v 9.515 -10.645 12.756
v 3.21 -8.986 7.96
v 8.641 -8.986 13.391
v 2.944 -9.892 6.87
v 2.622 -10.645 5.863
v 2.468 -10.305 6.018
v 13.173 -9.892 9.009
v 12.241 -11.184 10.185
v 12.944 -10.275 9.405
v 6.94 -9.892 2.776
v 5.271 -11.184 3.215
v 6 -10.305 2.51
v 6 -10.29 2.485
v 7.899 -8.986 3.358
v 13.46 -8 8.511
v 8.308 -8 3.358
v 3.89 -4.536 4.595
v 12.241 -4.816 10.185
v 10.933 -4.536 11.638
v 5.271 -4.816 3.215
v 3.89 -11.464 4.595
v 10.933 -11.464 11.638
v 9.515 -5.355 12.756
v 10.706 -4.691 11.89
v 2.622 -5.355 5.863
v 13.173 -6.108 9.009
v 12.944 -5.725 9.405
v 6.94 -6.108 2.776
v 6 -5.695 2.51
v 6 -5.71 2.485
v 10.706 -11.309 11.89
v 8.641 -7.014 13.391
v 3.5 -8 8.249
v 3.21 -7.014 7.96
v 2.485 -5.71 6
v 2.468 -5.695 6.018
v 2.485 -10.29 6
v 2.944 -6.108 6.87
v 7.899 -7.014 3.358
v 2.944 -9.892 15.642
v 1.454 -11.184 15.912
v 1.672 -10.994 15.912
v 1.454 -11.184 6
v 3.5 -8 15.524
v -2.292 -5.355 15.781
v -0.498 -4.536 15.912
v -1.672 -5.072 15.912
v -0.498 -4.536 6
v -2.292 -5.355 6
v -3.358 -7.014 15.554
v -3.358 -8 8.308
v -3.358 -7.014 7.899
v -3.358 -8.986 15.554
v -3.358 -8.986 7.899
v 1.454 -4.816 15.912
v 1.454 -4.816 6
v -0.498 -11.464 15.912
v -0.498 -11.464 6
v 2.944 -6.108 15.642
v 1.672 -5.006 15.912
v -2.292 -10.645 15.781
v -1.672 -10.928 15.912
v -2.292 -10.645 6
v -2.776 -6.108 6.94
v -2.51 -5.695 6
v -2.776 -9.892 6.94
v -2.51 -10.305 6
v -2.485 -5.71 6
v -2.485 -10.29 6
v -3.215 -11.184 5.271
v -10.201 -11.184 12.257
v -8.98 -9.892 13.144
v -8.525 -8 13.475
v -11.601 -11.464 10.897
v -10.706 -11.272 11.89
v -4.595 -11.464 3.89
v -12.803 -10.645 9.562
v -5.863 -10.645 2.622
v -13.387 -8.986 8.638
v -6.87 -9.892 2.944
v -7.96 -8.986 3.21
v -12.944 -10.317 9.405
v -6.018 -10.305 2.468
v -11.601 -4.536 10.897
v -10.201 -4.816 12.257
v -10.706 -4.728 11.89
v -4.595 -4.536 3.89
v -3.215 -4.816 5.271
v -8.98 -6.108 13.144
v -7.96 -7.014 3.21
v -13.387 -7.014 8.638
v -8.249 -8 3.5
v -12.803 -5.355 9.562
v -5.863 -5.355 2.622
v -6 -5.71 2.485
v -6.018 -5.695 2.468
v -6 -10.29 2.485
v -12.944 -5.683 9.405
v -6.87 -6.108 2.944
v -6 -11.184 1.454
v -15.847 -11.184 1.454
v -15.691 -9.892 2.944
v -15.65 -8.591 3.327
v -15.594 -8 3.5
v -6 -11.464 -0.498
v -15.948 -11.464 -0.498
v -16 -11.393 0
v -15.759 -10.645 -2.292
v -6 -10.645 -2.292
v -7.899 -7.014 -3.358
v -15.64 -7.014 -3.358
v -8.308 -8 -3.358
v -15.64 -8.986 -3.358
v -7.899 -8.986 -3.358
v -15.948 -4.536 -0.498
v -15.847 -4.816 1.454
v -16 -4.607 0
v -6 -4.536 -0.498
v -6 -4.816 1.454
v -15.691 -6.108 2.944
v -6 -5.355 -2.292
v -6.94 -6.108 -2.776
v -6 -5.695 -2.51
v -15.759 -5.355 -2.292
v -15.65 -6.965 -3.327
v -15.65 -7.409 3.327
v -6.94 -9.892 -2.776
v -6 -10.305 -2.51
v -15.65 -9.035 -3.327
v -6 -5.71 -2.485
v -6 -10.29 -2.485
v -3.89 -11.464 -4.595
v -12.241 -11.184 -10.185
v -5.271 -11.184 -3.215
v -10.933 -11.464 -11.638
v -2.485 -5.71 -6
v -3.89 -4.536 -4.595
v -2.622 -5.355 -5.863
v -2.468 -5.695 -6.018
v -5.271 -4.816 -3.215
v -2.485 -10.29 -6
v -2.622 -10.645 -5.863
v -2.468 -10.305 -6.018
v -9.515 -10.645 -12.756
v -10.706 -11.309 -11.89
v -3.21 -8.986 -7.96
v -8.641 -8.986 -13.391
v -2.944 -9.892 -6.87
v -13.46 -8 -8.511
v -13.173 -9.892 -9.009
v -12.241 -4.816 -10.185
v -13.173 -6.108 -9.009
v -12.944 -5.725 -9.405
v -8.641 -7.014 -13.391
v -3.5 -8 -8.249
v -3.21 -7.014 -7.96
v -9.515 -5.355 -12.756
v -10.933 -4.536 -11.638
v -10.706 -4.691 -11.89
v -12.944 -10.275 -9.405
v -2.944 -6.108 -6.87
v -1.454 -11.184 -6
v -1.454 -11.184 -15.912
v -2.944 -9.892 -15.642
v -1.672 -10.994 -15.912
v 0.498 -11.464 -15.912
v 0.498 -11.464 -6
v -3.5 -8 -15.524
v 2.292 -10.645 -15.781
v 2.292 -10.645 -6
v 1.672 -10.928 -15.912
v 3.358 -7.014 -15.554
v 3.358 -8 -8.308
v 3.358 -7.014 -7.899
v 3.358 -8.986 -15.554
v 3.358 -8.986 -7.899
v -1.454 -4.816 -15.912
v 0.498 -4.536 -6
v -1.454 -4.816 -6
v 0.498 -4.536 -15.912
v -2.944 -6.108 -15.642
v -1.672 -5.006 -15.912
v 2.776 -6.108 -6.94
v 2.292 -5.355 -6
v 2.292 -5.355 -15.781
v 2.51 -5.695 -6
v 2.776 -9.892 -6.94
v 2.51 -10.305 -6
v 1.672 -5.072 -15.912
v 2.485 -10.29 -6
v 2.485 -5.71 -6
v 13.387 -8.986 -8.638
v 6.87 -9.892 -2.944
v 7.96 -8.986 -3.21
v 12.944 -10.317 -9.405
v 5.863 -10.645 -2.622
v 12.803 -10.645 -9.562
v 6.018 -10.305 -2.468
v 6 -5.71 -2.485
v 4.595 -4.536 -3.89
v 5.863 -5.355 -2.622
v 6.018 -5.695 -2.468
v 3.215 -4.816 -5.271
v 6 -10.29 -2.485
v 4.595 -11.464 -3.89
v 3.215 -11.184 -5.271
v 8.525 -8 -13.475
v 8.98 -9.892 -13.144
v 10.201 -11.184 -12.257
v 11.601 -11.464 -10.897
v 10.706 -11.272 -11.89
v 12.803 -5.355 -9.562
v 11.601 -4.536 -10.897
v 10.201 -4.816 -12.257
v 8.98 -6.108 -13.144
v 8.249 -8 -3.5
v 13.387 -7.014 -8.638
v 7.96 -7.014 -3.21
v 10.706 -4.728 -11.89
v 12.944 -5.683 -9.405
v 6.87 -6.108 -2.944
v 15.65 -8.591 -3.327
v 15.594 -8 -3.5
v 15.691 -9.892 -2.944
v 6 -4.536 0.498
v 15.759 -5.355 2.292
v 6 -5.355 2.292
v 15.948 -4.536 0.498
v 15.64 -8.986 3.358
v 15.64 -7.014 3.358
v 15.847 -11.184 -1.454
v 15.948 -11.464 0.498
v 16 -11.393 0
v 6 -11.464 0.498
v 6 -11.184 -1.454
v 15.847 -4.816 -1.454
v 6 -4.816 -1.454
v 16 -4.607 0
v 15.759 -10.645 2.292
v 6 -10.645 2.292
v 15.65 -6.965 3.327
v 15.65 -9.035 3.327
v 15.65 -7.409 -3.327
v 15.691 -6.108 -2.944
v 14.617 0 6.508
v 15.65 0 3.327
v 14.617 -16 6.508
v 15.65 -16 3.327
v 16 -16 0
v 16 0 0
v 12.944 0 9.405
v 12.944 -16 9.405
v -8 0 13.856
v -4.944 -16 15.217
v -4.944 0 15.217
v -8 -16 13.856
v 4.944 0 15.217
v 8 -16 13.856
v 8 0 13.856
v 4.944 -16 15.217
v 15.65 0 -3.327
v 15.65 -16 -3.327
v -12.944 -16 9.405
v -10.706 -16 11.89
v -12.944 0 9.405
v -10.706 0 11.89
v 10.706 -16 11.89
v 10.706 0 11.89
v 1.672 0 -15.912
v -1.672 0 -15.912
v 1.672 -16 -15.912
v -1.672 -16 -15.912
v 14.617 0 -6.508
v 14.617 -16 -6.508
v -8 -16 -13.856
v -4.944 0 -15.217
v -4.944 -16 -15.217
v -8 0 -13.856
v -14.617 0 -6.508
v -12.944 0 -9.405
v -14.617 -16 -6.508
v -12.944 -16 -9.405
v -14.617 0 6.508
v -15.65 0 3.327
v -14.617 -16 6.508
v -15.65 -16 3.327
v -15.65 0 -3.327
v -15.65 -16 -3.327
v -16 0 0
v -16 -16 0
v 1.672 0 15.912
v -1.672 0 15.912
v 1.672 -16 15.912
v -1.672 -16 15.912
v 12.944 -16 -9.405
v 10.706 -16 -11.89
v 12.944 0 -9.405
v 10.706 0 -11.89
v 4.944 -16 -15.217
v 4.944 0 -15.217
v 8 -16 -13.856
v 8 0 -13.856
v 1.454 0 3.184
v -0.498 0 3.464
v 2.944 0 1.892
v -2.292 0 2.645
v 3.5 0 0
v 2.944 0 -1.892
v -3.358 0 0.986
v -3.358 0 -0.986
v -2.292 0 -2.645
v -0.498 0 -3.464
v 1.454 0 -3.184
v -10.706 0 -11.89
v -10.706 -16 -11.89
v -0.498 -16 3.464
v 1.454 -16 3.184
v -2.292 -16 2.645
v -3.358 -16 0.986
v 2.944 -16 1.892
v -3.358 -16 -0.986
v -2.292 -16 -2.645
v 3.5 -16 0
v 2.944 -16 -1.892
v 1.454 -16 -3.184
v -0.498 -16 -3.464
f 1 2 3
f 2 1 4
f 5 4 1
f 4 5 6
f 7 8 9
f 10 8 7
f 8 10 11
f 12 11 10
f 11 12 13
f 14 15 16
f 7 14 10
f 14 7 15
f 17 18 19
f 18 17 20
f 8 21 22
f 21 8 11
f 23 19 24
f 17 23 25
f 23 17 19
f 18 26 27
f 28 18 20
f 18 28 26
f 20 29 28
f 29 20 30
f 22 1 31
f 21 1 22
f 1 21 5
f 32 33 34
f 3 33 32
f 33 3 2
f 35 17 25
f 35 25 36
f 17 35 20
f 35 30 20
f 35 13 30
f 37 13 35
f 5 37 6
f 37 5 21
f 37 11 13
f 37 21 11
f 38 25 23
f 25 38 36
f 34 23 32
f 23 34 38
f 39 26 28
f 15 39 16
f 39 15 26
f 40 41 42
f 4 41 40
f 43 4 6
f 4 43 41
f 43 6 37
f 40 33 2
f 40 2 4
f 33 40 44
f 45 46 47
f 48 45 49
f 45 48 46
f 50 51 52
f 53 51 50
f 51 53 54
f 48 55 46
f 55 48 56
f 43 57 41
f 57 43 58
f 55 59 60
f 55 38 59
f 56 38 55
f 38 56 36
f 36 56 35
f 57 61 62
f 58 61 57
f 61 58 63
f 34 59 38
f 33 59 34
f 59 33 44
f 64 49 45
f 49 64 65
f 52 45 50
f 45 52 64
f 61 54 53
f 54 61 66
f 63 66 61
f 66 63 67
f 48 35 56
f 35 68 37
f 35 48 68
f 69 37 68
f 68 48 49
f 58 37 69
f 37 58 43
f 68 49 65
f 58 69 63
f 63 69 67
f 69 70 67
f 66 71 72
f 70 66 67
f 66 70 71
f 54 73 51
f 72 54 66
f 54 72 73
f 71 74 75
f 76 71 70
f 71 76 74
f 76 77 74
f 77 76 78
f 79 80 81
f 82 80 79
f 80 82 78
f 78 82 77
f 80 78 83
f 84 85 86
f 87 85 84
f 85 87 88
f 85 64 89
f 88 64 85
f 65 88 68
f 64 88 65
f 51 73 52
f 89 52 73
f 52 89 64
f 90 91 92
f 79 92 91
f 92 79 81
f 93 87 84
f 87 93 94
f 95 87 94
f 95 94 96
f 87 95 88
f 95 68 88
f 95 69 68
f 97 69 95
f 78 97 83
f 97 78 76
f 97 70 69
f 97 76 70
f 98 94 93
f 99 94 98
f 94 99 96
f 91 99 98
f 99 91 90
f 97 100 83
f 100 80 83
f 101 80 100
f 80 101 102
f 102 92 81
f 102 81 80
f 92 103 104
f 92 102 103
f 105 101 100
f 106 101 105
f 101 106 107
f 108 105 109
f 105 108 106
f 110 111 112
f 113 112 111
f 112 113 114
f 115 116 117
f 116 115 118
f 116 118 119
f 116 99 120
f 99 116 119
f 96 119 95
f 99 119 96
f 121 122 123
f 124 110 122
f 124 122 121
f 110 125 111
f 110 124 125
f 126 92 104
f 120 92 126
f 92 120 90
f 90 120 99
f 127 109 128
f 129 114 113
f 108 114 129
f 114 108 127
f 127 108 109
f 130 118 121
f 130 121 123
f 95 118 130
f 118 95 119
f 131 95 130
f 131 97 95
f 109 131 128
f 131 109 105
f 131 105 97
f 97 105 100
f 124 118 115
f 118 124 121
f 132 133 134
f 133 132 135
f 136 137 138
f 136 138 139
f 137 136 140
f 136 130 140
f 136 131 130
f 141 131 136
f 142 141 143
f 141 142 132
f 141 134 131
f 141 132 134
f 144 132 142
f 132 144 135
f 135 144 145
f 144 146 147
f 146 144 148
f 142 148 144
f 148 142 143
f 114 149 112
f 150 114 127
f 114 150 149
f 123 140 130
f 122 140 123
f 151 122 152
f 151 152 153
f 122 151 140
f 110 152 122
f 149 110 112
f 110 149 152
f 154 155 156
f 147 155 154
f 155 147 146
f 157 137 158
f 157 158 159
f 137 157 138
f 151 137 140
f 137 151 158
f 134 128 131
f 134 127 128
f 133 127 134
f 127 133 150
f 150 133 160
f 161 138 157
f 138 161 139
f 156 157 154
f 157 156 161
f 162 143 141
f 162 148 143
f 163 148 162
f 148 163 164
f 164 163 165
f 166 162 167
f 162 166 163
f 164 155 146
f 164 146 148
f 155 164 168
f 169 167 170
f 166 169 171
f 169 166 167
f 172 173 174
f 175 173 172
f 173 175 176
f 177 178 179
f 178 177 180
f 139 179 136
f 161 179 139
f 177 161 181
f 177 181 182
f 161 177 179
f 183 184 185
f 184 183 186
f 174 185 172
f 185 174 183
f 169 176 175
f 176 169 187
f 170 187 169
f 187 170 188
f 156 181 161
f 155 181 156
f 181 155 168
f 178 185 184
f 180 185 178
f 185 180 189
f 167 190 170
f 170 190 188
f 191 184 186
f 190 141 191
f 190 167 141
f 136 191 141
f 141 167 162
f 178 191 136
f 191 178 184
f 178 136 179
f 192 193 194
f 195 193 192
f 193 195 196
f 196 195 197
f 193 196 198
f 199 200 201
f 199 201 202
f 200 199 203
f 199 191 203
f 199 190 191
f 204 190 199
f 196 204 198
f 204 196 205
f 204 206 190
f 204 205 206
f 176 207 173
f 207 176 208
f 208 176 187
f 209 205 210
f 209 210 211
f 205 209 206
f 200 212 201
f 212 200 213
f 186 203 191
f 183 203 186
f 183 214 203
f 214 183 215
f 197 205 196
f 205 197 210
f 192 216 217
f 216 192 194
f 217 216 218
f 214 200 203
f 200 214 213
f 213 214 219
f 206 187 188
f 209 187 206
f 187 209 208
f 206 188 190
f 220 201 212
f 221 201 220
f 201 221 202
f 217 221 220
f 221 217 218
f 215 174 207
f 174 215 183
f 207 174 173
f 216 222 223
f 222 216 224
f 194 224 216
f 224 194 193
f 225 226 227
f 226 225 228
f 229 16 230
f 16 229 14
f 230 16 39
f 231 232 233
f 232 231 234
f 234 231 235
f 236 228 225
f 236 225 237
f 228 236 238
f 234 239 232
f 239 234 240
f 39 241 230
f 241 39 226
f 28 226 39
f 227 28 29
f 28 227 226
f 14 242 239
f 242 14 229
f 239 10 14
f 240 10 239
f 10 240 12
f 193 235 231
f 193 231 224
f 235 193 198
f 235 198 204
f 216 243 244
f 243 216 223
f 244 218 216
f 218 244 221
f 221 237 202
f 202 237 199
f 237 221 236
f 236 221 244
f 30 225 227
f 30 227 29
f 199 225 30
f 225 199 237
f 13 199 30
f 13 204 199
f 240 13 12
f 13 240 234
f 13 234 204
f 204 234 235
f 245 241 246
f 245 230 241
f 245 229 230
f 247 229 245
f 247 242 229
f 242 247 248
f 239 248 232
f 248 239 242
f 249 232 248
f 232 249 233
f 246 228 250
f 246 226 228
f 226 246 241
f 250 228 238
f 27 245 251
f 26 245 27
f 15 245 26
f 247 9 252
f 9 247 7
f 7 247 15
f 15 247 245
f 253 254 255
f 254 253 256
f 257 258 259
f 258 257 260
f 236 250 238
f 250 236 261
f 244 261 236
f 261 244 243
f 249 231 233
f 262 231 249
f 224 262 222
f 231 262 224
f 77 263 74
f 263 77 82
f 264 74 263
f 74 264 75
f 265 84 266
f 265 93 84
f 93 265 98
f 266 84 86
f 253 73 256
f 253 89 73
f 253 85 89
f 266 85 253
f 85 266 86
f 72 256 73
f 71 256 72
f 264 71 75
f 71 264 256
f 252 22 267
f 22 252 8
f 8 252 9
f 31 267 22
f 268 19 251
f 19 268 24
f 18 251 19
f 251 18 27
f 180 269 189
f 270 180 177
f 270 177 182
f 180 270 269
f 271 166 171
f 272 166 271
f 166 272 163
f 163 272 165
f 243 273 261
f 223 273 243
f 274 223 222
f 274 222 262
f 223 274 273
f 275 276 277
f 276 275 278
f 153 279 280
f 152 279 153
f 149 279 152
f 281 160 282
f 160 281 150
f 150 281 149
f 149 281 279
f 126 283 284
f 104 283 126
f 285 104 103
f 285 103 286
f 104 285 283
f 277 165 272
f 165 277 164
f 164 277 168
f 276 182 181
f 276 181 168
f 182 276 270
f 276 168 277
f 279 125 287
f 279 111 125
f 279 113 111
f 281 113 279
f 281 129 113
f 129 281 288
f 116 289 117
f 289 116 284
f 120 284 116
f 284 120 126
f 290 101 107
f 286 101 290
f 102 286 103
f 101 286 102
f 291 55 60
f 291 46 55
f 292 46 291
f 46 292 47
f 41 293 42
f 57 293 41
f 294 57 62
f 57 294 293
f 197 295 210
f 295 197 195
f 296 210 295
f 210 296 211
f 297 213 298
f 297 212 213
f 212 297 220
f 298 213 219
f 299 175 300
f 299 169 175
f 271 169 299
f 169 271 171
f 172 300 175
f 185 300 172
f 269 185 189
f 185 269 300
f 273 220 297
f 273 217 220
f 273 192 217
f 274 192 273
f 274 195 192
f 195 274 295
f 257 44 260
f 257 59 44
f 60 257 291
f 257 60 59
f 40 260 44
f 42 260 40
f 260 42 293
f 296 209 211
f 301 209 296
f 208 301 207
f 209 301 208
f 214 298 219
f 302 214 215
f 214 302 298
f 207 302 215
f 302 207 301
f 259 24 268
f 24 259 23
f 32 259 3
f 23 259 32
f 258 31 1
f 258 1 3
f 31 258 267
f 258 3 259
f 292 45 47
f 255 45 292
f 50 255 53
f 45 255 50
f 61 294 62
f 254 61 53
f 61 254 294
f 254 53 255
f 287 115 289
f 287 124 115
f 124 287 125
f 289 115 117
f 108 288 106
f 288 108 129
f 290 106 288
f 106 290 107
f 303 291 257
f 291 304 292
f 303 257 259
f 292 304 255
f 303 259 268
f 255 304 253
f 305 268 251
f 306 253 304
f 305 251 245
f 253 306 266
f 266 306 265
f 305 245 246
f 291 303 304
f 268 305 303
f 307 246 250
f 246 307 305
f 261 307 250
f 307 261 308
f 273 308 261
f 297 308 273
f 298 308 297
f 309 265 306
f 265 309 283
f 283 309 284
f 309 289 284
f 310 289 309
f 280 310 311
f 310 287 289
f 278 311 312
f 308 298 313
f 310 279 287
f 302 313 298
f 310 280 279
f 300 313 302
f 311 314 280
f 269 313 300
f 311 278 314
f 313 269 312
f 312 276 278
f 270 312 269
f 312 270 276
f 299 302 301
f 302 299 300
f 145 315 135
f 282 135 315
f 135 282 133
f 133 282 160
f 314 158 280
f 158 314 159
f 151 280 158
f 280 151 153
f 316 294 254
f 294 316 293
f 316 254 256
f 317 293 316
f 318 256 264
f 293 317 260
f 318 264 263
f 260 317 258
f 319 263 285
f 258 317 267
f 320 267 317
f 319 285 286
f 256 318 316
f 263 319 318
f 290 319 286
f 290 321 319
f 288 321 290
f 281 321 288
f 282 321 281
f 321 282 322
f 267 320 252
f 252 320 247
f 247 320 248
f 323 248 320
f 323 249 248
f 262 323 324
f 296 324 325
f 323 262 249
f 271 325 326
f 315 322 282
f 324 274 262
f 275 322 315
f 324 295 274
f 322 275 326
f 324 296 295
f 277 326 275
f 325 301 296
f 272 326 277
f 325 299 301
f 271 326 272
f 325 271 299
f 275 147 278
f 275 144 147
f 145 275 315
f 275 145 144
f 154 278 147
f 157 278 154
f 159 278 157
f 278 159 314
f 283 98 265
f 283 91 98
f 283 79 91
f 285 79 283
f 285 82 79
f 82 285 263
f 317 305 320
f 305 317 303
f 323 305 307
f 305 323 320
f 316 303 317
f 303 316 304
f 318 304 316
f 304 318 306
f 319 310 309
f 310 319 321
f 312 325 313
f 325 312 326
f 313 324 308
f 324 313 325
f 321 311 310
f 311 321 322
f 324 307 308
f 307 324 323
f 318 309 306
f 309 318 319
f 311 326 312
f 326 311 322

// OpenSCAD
// file: LegoSide.scad
lfh=8;
lmh=1.8;
//ignore utility
module legoMale(){
    cylinder(r=2.4,h=1.8);
}
//ignore utility
module legoFemale(){
difference(){
    cylinder(r=3.25,h=8);
    cylinder(r=2.4,h=8);
}
}
//use this module if the lego builds on from the base    
//creates a rectangle of lego heads (the sticking out part) with the origin through the first heads center
//translate and rotate these modules to match sides of the model
//x: number of lego heads in x direction
//y: number of lego heads in y direction
module boardMale(x,y){
    for(i=[0:x-1]){
        for(j=[0:y-1]){
            translate([i*8,j*8,0]) legoMale();
        }
    }
}
//use this module if the lego builds into the model  
//creates a rectangle of lego inserts (built into the part) with the the origin through the first insert's center
//translate and rotate these modules to match sides of the model
//x: number of lego heads in x direction
//y: number of lego heads in y direction
module boardFemale(x,y){
    for(i=[0:x-1]){
        for(j=[0:y-1]){
            translate([i*8,j*8,0]) legoFemale();
        }
    }
}
//boardFemale(3,1);

//fills a rectangle of w (x direction) and h (y direction). Module will estimate based on closest lego standard
//male part is built on
module fillMale(w,h){
    translate([4,4,0]) boardMale((w+16.2)/8,((h+16.2)/8));
}
//female part is built into 
module fillFemale(w,h){
    boardFemale(((w+16.2)/8),((h+16.2)/8));
}



module testLego(w,h){
union(){
    cube([w,h,3]);
    intersection(){
        cube([(w/2)-4,h,3+lmh]);
        translate([0,0,3]) fillMale(w,h);
    }
    intersection(){
        translate([(w/2)+4,0,0]) cube([(w/2)-4,h,3+lfh]);
        translate([(w/2)+4,0,3]) fillFemale(w,h);
    }
}
}

//testLego(40,20);
//fillFemale(18,26);
//fillMale(18,26);
// main file
use<LegoSide.scad>;
module LegoFemale(w,h){
union(){
difference(){
    cube([w,h,9.5]);
    translate([1.5,1.5,1.5]) cube([w-3,h-3, 8]);
}
    translate([0,0,1.5]) fillFemale(w,h);
}
}
//LegoFemale(31.8,15.8);
module LegoMale(w,h,d){
   union(){
        cube([w,h,d]);
        translate([0,0,d]) fillMale(w,h);
    }
}
//LegoMale(31.8,15.8,9.5);
module TinkerMale(){
difference(){
    cylinder(r=3.125,h=12);
    translate([-.5,-3.125,6]) cube([1,6.25,6]);
}
}
//TinkerMale();
module TinkerFemale(){//functional
rotate([90,0,0])difference(){
    cylinder(r=16,h=16);
    cylinder(r=3.5,h=16);
   for(i=[-45:45:315]){
        rotate([0,0,i]) translate([0,16,8]) rotate([90,0,0]) cylinder(r=3.5, h=10);
    }
}
}
TinkerFemale();
module TinkerFemaleSphere(){
difference(){
    sphere(r=16);
    translate([-16,-16,-16]) cube([32,32,16]);
    for(i=[-45:45:45]){
        rotate([i,0,0])translate([0,0,6]) cylinder(r=3.5, h=10);
        rotate([0,i,0])translate([0,0,6]) cylinder(r=3.5, h=10);
        rotate([i,0,45])translate([0,0,6]) cylinder(r=3.5, h=10);
        rotate([i,0,-45])translate([0,0,6]) cylinder(r=3.5, h=10);
    }
}
}
//TinkerFemaleSphere();
module ZoobMale(){
   union(){
        cylinder(r=2.65,h=5);
        translate([0,0,3+9.15]) sphere(r=9.15);
    }
}
//ZoobMale();
module ZoobFemale(){
translate([0,0,13])difference(){
    union(){
        translate([0,0,-13.5]) cylinder(r=7, h=5.5);
        sphere(r=10.5);
    }
    sphere(r=9.5);
    translate([-5.9,-10.5,-6]) cube([11.8,21,20]);
}
}
//ZoobFemale();
        
